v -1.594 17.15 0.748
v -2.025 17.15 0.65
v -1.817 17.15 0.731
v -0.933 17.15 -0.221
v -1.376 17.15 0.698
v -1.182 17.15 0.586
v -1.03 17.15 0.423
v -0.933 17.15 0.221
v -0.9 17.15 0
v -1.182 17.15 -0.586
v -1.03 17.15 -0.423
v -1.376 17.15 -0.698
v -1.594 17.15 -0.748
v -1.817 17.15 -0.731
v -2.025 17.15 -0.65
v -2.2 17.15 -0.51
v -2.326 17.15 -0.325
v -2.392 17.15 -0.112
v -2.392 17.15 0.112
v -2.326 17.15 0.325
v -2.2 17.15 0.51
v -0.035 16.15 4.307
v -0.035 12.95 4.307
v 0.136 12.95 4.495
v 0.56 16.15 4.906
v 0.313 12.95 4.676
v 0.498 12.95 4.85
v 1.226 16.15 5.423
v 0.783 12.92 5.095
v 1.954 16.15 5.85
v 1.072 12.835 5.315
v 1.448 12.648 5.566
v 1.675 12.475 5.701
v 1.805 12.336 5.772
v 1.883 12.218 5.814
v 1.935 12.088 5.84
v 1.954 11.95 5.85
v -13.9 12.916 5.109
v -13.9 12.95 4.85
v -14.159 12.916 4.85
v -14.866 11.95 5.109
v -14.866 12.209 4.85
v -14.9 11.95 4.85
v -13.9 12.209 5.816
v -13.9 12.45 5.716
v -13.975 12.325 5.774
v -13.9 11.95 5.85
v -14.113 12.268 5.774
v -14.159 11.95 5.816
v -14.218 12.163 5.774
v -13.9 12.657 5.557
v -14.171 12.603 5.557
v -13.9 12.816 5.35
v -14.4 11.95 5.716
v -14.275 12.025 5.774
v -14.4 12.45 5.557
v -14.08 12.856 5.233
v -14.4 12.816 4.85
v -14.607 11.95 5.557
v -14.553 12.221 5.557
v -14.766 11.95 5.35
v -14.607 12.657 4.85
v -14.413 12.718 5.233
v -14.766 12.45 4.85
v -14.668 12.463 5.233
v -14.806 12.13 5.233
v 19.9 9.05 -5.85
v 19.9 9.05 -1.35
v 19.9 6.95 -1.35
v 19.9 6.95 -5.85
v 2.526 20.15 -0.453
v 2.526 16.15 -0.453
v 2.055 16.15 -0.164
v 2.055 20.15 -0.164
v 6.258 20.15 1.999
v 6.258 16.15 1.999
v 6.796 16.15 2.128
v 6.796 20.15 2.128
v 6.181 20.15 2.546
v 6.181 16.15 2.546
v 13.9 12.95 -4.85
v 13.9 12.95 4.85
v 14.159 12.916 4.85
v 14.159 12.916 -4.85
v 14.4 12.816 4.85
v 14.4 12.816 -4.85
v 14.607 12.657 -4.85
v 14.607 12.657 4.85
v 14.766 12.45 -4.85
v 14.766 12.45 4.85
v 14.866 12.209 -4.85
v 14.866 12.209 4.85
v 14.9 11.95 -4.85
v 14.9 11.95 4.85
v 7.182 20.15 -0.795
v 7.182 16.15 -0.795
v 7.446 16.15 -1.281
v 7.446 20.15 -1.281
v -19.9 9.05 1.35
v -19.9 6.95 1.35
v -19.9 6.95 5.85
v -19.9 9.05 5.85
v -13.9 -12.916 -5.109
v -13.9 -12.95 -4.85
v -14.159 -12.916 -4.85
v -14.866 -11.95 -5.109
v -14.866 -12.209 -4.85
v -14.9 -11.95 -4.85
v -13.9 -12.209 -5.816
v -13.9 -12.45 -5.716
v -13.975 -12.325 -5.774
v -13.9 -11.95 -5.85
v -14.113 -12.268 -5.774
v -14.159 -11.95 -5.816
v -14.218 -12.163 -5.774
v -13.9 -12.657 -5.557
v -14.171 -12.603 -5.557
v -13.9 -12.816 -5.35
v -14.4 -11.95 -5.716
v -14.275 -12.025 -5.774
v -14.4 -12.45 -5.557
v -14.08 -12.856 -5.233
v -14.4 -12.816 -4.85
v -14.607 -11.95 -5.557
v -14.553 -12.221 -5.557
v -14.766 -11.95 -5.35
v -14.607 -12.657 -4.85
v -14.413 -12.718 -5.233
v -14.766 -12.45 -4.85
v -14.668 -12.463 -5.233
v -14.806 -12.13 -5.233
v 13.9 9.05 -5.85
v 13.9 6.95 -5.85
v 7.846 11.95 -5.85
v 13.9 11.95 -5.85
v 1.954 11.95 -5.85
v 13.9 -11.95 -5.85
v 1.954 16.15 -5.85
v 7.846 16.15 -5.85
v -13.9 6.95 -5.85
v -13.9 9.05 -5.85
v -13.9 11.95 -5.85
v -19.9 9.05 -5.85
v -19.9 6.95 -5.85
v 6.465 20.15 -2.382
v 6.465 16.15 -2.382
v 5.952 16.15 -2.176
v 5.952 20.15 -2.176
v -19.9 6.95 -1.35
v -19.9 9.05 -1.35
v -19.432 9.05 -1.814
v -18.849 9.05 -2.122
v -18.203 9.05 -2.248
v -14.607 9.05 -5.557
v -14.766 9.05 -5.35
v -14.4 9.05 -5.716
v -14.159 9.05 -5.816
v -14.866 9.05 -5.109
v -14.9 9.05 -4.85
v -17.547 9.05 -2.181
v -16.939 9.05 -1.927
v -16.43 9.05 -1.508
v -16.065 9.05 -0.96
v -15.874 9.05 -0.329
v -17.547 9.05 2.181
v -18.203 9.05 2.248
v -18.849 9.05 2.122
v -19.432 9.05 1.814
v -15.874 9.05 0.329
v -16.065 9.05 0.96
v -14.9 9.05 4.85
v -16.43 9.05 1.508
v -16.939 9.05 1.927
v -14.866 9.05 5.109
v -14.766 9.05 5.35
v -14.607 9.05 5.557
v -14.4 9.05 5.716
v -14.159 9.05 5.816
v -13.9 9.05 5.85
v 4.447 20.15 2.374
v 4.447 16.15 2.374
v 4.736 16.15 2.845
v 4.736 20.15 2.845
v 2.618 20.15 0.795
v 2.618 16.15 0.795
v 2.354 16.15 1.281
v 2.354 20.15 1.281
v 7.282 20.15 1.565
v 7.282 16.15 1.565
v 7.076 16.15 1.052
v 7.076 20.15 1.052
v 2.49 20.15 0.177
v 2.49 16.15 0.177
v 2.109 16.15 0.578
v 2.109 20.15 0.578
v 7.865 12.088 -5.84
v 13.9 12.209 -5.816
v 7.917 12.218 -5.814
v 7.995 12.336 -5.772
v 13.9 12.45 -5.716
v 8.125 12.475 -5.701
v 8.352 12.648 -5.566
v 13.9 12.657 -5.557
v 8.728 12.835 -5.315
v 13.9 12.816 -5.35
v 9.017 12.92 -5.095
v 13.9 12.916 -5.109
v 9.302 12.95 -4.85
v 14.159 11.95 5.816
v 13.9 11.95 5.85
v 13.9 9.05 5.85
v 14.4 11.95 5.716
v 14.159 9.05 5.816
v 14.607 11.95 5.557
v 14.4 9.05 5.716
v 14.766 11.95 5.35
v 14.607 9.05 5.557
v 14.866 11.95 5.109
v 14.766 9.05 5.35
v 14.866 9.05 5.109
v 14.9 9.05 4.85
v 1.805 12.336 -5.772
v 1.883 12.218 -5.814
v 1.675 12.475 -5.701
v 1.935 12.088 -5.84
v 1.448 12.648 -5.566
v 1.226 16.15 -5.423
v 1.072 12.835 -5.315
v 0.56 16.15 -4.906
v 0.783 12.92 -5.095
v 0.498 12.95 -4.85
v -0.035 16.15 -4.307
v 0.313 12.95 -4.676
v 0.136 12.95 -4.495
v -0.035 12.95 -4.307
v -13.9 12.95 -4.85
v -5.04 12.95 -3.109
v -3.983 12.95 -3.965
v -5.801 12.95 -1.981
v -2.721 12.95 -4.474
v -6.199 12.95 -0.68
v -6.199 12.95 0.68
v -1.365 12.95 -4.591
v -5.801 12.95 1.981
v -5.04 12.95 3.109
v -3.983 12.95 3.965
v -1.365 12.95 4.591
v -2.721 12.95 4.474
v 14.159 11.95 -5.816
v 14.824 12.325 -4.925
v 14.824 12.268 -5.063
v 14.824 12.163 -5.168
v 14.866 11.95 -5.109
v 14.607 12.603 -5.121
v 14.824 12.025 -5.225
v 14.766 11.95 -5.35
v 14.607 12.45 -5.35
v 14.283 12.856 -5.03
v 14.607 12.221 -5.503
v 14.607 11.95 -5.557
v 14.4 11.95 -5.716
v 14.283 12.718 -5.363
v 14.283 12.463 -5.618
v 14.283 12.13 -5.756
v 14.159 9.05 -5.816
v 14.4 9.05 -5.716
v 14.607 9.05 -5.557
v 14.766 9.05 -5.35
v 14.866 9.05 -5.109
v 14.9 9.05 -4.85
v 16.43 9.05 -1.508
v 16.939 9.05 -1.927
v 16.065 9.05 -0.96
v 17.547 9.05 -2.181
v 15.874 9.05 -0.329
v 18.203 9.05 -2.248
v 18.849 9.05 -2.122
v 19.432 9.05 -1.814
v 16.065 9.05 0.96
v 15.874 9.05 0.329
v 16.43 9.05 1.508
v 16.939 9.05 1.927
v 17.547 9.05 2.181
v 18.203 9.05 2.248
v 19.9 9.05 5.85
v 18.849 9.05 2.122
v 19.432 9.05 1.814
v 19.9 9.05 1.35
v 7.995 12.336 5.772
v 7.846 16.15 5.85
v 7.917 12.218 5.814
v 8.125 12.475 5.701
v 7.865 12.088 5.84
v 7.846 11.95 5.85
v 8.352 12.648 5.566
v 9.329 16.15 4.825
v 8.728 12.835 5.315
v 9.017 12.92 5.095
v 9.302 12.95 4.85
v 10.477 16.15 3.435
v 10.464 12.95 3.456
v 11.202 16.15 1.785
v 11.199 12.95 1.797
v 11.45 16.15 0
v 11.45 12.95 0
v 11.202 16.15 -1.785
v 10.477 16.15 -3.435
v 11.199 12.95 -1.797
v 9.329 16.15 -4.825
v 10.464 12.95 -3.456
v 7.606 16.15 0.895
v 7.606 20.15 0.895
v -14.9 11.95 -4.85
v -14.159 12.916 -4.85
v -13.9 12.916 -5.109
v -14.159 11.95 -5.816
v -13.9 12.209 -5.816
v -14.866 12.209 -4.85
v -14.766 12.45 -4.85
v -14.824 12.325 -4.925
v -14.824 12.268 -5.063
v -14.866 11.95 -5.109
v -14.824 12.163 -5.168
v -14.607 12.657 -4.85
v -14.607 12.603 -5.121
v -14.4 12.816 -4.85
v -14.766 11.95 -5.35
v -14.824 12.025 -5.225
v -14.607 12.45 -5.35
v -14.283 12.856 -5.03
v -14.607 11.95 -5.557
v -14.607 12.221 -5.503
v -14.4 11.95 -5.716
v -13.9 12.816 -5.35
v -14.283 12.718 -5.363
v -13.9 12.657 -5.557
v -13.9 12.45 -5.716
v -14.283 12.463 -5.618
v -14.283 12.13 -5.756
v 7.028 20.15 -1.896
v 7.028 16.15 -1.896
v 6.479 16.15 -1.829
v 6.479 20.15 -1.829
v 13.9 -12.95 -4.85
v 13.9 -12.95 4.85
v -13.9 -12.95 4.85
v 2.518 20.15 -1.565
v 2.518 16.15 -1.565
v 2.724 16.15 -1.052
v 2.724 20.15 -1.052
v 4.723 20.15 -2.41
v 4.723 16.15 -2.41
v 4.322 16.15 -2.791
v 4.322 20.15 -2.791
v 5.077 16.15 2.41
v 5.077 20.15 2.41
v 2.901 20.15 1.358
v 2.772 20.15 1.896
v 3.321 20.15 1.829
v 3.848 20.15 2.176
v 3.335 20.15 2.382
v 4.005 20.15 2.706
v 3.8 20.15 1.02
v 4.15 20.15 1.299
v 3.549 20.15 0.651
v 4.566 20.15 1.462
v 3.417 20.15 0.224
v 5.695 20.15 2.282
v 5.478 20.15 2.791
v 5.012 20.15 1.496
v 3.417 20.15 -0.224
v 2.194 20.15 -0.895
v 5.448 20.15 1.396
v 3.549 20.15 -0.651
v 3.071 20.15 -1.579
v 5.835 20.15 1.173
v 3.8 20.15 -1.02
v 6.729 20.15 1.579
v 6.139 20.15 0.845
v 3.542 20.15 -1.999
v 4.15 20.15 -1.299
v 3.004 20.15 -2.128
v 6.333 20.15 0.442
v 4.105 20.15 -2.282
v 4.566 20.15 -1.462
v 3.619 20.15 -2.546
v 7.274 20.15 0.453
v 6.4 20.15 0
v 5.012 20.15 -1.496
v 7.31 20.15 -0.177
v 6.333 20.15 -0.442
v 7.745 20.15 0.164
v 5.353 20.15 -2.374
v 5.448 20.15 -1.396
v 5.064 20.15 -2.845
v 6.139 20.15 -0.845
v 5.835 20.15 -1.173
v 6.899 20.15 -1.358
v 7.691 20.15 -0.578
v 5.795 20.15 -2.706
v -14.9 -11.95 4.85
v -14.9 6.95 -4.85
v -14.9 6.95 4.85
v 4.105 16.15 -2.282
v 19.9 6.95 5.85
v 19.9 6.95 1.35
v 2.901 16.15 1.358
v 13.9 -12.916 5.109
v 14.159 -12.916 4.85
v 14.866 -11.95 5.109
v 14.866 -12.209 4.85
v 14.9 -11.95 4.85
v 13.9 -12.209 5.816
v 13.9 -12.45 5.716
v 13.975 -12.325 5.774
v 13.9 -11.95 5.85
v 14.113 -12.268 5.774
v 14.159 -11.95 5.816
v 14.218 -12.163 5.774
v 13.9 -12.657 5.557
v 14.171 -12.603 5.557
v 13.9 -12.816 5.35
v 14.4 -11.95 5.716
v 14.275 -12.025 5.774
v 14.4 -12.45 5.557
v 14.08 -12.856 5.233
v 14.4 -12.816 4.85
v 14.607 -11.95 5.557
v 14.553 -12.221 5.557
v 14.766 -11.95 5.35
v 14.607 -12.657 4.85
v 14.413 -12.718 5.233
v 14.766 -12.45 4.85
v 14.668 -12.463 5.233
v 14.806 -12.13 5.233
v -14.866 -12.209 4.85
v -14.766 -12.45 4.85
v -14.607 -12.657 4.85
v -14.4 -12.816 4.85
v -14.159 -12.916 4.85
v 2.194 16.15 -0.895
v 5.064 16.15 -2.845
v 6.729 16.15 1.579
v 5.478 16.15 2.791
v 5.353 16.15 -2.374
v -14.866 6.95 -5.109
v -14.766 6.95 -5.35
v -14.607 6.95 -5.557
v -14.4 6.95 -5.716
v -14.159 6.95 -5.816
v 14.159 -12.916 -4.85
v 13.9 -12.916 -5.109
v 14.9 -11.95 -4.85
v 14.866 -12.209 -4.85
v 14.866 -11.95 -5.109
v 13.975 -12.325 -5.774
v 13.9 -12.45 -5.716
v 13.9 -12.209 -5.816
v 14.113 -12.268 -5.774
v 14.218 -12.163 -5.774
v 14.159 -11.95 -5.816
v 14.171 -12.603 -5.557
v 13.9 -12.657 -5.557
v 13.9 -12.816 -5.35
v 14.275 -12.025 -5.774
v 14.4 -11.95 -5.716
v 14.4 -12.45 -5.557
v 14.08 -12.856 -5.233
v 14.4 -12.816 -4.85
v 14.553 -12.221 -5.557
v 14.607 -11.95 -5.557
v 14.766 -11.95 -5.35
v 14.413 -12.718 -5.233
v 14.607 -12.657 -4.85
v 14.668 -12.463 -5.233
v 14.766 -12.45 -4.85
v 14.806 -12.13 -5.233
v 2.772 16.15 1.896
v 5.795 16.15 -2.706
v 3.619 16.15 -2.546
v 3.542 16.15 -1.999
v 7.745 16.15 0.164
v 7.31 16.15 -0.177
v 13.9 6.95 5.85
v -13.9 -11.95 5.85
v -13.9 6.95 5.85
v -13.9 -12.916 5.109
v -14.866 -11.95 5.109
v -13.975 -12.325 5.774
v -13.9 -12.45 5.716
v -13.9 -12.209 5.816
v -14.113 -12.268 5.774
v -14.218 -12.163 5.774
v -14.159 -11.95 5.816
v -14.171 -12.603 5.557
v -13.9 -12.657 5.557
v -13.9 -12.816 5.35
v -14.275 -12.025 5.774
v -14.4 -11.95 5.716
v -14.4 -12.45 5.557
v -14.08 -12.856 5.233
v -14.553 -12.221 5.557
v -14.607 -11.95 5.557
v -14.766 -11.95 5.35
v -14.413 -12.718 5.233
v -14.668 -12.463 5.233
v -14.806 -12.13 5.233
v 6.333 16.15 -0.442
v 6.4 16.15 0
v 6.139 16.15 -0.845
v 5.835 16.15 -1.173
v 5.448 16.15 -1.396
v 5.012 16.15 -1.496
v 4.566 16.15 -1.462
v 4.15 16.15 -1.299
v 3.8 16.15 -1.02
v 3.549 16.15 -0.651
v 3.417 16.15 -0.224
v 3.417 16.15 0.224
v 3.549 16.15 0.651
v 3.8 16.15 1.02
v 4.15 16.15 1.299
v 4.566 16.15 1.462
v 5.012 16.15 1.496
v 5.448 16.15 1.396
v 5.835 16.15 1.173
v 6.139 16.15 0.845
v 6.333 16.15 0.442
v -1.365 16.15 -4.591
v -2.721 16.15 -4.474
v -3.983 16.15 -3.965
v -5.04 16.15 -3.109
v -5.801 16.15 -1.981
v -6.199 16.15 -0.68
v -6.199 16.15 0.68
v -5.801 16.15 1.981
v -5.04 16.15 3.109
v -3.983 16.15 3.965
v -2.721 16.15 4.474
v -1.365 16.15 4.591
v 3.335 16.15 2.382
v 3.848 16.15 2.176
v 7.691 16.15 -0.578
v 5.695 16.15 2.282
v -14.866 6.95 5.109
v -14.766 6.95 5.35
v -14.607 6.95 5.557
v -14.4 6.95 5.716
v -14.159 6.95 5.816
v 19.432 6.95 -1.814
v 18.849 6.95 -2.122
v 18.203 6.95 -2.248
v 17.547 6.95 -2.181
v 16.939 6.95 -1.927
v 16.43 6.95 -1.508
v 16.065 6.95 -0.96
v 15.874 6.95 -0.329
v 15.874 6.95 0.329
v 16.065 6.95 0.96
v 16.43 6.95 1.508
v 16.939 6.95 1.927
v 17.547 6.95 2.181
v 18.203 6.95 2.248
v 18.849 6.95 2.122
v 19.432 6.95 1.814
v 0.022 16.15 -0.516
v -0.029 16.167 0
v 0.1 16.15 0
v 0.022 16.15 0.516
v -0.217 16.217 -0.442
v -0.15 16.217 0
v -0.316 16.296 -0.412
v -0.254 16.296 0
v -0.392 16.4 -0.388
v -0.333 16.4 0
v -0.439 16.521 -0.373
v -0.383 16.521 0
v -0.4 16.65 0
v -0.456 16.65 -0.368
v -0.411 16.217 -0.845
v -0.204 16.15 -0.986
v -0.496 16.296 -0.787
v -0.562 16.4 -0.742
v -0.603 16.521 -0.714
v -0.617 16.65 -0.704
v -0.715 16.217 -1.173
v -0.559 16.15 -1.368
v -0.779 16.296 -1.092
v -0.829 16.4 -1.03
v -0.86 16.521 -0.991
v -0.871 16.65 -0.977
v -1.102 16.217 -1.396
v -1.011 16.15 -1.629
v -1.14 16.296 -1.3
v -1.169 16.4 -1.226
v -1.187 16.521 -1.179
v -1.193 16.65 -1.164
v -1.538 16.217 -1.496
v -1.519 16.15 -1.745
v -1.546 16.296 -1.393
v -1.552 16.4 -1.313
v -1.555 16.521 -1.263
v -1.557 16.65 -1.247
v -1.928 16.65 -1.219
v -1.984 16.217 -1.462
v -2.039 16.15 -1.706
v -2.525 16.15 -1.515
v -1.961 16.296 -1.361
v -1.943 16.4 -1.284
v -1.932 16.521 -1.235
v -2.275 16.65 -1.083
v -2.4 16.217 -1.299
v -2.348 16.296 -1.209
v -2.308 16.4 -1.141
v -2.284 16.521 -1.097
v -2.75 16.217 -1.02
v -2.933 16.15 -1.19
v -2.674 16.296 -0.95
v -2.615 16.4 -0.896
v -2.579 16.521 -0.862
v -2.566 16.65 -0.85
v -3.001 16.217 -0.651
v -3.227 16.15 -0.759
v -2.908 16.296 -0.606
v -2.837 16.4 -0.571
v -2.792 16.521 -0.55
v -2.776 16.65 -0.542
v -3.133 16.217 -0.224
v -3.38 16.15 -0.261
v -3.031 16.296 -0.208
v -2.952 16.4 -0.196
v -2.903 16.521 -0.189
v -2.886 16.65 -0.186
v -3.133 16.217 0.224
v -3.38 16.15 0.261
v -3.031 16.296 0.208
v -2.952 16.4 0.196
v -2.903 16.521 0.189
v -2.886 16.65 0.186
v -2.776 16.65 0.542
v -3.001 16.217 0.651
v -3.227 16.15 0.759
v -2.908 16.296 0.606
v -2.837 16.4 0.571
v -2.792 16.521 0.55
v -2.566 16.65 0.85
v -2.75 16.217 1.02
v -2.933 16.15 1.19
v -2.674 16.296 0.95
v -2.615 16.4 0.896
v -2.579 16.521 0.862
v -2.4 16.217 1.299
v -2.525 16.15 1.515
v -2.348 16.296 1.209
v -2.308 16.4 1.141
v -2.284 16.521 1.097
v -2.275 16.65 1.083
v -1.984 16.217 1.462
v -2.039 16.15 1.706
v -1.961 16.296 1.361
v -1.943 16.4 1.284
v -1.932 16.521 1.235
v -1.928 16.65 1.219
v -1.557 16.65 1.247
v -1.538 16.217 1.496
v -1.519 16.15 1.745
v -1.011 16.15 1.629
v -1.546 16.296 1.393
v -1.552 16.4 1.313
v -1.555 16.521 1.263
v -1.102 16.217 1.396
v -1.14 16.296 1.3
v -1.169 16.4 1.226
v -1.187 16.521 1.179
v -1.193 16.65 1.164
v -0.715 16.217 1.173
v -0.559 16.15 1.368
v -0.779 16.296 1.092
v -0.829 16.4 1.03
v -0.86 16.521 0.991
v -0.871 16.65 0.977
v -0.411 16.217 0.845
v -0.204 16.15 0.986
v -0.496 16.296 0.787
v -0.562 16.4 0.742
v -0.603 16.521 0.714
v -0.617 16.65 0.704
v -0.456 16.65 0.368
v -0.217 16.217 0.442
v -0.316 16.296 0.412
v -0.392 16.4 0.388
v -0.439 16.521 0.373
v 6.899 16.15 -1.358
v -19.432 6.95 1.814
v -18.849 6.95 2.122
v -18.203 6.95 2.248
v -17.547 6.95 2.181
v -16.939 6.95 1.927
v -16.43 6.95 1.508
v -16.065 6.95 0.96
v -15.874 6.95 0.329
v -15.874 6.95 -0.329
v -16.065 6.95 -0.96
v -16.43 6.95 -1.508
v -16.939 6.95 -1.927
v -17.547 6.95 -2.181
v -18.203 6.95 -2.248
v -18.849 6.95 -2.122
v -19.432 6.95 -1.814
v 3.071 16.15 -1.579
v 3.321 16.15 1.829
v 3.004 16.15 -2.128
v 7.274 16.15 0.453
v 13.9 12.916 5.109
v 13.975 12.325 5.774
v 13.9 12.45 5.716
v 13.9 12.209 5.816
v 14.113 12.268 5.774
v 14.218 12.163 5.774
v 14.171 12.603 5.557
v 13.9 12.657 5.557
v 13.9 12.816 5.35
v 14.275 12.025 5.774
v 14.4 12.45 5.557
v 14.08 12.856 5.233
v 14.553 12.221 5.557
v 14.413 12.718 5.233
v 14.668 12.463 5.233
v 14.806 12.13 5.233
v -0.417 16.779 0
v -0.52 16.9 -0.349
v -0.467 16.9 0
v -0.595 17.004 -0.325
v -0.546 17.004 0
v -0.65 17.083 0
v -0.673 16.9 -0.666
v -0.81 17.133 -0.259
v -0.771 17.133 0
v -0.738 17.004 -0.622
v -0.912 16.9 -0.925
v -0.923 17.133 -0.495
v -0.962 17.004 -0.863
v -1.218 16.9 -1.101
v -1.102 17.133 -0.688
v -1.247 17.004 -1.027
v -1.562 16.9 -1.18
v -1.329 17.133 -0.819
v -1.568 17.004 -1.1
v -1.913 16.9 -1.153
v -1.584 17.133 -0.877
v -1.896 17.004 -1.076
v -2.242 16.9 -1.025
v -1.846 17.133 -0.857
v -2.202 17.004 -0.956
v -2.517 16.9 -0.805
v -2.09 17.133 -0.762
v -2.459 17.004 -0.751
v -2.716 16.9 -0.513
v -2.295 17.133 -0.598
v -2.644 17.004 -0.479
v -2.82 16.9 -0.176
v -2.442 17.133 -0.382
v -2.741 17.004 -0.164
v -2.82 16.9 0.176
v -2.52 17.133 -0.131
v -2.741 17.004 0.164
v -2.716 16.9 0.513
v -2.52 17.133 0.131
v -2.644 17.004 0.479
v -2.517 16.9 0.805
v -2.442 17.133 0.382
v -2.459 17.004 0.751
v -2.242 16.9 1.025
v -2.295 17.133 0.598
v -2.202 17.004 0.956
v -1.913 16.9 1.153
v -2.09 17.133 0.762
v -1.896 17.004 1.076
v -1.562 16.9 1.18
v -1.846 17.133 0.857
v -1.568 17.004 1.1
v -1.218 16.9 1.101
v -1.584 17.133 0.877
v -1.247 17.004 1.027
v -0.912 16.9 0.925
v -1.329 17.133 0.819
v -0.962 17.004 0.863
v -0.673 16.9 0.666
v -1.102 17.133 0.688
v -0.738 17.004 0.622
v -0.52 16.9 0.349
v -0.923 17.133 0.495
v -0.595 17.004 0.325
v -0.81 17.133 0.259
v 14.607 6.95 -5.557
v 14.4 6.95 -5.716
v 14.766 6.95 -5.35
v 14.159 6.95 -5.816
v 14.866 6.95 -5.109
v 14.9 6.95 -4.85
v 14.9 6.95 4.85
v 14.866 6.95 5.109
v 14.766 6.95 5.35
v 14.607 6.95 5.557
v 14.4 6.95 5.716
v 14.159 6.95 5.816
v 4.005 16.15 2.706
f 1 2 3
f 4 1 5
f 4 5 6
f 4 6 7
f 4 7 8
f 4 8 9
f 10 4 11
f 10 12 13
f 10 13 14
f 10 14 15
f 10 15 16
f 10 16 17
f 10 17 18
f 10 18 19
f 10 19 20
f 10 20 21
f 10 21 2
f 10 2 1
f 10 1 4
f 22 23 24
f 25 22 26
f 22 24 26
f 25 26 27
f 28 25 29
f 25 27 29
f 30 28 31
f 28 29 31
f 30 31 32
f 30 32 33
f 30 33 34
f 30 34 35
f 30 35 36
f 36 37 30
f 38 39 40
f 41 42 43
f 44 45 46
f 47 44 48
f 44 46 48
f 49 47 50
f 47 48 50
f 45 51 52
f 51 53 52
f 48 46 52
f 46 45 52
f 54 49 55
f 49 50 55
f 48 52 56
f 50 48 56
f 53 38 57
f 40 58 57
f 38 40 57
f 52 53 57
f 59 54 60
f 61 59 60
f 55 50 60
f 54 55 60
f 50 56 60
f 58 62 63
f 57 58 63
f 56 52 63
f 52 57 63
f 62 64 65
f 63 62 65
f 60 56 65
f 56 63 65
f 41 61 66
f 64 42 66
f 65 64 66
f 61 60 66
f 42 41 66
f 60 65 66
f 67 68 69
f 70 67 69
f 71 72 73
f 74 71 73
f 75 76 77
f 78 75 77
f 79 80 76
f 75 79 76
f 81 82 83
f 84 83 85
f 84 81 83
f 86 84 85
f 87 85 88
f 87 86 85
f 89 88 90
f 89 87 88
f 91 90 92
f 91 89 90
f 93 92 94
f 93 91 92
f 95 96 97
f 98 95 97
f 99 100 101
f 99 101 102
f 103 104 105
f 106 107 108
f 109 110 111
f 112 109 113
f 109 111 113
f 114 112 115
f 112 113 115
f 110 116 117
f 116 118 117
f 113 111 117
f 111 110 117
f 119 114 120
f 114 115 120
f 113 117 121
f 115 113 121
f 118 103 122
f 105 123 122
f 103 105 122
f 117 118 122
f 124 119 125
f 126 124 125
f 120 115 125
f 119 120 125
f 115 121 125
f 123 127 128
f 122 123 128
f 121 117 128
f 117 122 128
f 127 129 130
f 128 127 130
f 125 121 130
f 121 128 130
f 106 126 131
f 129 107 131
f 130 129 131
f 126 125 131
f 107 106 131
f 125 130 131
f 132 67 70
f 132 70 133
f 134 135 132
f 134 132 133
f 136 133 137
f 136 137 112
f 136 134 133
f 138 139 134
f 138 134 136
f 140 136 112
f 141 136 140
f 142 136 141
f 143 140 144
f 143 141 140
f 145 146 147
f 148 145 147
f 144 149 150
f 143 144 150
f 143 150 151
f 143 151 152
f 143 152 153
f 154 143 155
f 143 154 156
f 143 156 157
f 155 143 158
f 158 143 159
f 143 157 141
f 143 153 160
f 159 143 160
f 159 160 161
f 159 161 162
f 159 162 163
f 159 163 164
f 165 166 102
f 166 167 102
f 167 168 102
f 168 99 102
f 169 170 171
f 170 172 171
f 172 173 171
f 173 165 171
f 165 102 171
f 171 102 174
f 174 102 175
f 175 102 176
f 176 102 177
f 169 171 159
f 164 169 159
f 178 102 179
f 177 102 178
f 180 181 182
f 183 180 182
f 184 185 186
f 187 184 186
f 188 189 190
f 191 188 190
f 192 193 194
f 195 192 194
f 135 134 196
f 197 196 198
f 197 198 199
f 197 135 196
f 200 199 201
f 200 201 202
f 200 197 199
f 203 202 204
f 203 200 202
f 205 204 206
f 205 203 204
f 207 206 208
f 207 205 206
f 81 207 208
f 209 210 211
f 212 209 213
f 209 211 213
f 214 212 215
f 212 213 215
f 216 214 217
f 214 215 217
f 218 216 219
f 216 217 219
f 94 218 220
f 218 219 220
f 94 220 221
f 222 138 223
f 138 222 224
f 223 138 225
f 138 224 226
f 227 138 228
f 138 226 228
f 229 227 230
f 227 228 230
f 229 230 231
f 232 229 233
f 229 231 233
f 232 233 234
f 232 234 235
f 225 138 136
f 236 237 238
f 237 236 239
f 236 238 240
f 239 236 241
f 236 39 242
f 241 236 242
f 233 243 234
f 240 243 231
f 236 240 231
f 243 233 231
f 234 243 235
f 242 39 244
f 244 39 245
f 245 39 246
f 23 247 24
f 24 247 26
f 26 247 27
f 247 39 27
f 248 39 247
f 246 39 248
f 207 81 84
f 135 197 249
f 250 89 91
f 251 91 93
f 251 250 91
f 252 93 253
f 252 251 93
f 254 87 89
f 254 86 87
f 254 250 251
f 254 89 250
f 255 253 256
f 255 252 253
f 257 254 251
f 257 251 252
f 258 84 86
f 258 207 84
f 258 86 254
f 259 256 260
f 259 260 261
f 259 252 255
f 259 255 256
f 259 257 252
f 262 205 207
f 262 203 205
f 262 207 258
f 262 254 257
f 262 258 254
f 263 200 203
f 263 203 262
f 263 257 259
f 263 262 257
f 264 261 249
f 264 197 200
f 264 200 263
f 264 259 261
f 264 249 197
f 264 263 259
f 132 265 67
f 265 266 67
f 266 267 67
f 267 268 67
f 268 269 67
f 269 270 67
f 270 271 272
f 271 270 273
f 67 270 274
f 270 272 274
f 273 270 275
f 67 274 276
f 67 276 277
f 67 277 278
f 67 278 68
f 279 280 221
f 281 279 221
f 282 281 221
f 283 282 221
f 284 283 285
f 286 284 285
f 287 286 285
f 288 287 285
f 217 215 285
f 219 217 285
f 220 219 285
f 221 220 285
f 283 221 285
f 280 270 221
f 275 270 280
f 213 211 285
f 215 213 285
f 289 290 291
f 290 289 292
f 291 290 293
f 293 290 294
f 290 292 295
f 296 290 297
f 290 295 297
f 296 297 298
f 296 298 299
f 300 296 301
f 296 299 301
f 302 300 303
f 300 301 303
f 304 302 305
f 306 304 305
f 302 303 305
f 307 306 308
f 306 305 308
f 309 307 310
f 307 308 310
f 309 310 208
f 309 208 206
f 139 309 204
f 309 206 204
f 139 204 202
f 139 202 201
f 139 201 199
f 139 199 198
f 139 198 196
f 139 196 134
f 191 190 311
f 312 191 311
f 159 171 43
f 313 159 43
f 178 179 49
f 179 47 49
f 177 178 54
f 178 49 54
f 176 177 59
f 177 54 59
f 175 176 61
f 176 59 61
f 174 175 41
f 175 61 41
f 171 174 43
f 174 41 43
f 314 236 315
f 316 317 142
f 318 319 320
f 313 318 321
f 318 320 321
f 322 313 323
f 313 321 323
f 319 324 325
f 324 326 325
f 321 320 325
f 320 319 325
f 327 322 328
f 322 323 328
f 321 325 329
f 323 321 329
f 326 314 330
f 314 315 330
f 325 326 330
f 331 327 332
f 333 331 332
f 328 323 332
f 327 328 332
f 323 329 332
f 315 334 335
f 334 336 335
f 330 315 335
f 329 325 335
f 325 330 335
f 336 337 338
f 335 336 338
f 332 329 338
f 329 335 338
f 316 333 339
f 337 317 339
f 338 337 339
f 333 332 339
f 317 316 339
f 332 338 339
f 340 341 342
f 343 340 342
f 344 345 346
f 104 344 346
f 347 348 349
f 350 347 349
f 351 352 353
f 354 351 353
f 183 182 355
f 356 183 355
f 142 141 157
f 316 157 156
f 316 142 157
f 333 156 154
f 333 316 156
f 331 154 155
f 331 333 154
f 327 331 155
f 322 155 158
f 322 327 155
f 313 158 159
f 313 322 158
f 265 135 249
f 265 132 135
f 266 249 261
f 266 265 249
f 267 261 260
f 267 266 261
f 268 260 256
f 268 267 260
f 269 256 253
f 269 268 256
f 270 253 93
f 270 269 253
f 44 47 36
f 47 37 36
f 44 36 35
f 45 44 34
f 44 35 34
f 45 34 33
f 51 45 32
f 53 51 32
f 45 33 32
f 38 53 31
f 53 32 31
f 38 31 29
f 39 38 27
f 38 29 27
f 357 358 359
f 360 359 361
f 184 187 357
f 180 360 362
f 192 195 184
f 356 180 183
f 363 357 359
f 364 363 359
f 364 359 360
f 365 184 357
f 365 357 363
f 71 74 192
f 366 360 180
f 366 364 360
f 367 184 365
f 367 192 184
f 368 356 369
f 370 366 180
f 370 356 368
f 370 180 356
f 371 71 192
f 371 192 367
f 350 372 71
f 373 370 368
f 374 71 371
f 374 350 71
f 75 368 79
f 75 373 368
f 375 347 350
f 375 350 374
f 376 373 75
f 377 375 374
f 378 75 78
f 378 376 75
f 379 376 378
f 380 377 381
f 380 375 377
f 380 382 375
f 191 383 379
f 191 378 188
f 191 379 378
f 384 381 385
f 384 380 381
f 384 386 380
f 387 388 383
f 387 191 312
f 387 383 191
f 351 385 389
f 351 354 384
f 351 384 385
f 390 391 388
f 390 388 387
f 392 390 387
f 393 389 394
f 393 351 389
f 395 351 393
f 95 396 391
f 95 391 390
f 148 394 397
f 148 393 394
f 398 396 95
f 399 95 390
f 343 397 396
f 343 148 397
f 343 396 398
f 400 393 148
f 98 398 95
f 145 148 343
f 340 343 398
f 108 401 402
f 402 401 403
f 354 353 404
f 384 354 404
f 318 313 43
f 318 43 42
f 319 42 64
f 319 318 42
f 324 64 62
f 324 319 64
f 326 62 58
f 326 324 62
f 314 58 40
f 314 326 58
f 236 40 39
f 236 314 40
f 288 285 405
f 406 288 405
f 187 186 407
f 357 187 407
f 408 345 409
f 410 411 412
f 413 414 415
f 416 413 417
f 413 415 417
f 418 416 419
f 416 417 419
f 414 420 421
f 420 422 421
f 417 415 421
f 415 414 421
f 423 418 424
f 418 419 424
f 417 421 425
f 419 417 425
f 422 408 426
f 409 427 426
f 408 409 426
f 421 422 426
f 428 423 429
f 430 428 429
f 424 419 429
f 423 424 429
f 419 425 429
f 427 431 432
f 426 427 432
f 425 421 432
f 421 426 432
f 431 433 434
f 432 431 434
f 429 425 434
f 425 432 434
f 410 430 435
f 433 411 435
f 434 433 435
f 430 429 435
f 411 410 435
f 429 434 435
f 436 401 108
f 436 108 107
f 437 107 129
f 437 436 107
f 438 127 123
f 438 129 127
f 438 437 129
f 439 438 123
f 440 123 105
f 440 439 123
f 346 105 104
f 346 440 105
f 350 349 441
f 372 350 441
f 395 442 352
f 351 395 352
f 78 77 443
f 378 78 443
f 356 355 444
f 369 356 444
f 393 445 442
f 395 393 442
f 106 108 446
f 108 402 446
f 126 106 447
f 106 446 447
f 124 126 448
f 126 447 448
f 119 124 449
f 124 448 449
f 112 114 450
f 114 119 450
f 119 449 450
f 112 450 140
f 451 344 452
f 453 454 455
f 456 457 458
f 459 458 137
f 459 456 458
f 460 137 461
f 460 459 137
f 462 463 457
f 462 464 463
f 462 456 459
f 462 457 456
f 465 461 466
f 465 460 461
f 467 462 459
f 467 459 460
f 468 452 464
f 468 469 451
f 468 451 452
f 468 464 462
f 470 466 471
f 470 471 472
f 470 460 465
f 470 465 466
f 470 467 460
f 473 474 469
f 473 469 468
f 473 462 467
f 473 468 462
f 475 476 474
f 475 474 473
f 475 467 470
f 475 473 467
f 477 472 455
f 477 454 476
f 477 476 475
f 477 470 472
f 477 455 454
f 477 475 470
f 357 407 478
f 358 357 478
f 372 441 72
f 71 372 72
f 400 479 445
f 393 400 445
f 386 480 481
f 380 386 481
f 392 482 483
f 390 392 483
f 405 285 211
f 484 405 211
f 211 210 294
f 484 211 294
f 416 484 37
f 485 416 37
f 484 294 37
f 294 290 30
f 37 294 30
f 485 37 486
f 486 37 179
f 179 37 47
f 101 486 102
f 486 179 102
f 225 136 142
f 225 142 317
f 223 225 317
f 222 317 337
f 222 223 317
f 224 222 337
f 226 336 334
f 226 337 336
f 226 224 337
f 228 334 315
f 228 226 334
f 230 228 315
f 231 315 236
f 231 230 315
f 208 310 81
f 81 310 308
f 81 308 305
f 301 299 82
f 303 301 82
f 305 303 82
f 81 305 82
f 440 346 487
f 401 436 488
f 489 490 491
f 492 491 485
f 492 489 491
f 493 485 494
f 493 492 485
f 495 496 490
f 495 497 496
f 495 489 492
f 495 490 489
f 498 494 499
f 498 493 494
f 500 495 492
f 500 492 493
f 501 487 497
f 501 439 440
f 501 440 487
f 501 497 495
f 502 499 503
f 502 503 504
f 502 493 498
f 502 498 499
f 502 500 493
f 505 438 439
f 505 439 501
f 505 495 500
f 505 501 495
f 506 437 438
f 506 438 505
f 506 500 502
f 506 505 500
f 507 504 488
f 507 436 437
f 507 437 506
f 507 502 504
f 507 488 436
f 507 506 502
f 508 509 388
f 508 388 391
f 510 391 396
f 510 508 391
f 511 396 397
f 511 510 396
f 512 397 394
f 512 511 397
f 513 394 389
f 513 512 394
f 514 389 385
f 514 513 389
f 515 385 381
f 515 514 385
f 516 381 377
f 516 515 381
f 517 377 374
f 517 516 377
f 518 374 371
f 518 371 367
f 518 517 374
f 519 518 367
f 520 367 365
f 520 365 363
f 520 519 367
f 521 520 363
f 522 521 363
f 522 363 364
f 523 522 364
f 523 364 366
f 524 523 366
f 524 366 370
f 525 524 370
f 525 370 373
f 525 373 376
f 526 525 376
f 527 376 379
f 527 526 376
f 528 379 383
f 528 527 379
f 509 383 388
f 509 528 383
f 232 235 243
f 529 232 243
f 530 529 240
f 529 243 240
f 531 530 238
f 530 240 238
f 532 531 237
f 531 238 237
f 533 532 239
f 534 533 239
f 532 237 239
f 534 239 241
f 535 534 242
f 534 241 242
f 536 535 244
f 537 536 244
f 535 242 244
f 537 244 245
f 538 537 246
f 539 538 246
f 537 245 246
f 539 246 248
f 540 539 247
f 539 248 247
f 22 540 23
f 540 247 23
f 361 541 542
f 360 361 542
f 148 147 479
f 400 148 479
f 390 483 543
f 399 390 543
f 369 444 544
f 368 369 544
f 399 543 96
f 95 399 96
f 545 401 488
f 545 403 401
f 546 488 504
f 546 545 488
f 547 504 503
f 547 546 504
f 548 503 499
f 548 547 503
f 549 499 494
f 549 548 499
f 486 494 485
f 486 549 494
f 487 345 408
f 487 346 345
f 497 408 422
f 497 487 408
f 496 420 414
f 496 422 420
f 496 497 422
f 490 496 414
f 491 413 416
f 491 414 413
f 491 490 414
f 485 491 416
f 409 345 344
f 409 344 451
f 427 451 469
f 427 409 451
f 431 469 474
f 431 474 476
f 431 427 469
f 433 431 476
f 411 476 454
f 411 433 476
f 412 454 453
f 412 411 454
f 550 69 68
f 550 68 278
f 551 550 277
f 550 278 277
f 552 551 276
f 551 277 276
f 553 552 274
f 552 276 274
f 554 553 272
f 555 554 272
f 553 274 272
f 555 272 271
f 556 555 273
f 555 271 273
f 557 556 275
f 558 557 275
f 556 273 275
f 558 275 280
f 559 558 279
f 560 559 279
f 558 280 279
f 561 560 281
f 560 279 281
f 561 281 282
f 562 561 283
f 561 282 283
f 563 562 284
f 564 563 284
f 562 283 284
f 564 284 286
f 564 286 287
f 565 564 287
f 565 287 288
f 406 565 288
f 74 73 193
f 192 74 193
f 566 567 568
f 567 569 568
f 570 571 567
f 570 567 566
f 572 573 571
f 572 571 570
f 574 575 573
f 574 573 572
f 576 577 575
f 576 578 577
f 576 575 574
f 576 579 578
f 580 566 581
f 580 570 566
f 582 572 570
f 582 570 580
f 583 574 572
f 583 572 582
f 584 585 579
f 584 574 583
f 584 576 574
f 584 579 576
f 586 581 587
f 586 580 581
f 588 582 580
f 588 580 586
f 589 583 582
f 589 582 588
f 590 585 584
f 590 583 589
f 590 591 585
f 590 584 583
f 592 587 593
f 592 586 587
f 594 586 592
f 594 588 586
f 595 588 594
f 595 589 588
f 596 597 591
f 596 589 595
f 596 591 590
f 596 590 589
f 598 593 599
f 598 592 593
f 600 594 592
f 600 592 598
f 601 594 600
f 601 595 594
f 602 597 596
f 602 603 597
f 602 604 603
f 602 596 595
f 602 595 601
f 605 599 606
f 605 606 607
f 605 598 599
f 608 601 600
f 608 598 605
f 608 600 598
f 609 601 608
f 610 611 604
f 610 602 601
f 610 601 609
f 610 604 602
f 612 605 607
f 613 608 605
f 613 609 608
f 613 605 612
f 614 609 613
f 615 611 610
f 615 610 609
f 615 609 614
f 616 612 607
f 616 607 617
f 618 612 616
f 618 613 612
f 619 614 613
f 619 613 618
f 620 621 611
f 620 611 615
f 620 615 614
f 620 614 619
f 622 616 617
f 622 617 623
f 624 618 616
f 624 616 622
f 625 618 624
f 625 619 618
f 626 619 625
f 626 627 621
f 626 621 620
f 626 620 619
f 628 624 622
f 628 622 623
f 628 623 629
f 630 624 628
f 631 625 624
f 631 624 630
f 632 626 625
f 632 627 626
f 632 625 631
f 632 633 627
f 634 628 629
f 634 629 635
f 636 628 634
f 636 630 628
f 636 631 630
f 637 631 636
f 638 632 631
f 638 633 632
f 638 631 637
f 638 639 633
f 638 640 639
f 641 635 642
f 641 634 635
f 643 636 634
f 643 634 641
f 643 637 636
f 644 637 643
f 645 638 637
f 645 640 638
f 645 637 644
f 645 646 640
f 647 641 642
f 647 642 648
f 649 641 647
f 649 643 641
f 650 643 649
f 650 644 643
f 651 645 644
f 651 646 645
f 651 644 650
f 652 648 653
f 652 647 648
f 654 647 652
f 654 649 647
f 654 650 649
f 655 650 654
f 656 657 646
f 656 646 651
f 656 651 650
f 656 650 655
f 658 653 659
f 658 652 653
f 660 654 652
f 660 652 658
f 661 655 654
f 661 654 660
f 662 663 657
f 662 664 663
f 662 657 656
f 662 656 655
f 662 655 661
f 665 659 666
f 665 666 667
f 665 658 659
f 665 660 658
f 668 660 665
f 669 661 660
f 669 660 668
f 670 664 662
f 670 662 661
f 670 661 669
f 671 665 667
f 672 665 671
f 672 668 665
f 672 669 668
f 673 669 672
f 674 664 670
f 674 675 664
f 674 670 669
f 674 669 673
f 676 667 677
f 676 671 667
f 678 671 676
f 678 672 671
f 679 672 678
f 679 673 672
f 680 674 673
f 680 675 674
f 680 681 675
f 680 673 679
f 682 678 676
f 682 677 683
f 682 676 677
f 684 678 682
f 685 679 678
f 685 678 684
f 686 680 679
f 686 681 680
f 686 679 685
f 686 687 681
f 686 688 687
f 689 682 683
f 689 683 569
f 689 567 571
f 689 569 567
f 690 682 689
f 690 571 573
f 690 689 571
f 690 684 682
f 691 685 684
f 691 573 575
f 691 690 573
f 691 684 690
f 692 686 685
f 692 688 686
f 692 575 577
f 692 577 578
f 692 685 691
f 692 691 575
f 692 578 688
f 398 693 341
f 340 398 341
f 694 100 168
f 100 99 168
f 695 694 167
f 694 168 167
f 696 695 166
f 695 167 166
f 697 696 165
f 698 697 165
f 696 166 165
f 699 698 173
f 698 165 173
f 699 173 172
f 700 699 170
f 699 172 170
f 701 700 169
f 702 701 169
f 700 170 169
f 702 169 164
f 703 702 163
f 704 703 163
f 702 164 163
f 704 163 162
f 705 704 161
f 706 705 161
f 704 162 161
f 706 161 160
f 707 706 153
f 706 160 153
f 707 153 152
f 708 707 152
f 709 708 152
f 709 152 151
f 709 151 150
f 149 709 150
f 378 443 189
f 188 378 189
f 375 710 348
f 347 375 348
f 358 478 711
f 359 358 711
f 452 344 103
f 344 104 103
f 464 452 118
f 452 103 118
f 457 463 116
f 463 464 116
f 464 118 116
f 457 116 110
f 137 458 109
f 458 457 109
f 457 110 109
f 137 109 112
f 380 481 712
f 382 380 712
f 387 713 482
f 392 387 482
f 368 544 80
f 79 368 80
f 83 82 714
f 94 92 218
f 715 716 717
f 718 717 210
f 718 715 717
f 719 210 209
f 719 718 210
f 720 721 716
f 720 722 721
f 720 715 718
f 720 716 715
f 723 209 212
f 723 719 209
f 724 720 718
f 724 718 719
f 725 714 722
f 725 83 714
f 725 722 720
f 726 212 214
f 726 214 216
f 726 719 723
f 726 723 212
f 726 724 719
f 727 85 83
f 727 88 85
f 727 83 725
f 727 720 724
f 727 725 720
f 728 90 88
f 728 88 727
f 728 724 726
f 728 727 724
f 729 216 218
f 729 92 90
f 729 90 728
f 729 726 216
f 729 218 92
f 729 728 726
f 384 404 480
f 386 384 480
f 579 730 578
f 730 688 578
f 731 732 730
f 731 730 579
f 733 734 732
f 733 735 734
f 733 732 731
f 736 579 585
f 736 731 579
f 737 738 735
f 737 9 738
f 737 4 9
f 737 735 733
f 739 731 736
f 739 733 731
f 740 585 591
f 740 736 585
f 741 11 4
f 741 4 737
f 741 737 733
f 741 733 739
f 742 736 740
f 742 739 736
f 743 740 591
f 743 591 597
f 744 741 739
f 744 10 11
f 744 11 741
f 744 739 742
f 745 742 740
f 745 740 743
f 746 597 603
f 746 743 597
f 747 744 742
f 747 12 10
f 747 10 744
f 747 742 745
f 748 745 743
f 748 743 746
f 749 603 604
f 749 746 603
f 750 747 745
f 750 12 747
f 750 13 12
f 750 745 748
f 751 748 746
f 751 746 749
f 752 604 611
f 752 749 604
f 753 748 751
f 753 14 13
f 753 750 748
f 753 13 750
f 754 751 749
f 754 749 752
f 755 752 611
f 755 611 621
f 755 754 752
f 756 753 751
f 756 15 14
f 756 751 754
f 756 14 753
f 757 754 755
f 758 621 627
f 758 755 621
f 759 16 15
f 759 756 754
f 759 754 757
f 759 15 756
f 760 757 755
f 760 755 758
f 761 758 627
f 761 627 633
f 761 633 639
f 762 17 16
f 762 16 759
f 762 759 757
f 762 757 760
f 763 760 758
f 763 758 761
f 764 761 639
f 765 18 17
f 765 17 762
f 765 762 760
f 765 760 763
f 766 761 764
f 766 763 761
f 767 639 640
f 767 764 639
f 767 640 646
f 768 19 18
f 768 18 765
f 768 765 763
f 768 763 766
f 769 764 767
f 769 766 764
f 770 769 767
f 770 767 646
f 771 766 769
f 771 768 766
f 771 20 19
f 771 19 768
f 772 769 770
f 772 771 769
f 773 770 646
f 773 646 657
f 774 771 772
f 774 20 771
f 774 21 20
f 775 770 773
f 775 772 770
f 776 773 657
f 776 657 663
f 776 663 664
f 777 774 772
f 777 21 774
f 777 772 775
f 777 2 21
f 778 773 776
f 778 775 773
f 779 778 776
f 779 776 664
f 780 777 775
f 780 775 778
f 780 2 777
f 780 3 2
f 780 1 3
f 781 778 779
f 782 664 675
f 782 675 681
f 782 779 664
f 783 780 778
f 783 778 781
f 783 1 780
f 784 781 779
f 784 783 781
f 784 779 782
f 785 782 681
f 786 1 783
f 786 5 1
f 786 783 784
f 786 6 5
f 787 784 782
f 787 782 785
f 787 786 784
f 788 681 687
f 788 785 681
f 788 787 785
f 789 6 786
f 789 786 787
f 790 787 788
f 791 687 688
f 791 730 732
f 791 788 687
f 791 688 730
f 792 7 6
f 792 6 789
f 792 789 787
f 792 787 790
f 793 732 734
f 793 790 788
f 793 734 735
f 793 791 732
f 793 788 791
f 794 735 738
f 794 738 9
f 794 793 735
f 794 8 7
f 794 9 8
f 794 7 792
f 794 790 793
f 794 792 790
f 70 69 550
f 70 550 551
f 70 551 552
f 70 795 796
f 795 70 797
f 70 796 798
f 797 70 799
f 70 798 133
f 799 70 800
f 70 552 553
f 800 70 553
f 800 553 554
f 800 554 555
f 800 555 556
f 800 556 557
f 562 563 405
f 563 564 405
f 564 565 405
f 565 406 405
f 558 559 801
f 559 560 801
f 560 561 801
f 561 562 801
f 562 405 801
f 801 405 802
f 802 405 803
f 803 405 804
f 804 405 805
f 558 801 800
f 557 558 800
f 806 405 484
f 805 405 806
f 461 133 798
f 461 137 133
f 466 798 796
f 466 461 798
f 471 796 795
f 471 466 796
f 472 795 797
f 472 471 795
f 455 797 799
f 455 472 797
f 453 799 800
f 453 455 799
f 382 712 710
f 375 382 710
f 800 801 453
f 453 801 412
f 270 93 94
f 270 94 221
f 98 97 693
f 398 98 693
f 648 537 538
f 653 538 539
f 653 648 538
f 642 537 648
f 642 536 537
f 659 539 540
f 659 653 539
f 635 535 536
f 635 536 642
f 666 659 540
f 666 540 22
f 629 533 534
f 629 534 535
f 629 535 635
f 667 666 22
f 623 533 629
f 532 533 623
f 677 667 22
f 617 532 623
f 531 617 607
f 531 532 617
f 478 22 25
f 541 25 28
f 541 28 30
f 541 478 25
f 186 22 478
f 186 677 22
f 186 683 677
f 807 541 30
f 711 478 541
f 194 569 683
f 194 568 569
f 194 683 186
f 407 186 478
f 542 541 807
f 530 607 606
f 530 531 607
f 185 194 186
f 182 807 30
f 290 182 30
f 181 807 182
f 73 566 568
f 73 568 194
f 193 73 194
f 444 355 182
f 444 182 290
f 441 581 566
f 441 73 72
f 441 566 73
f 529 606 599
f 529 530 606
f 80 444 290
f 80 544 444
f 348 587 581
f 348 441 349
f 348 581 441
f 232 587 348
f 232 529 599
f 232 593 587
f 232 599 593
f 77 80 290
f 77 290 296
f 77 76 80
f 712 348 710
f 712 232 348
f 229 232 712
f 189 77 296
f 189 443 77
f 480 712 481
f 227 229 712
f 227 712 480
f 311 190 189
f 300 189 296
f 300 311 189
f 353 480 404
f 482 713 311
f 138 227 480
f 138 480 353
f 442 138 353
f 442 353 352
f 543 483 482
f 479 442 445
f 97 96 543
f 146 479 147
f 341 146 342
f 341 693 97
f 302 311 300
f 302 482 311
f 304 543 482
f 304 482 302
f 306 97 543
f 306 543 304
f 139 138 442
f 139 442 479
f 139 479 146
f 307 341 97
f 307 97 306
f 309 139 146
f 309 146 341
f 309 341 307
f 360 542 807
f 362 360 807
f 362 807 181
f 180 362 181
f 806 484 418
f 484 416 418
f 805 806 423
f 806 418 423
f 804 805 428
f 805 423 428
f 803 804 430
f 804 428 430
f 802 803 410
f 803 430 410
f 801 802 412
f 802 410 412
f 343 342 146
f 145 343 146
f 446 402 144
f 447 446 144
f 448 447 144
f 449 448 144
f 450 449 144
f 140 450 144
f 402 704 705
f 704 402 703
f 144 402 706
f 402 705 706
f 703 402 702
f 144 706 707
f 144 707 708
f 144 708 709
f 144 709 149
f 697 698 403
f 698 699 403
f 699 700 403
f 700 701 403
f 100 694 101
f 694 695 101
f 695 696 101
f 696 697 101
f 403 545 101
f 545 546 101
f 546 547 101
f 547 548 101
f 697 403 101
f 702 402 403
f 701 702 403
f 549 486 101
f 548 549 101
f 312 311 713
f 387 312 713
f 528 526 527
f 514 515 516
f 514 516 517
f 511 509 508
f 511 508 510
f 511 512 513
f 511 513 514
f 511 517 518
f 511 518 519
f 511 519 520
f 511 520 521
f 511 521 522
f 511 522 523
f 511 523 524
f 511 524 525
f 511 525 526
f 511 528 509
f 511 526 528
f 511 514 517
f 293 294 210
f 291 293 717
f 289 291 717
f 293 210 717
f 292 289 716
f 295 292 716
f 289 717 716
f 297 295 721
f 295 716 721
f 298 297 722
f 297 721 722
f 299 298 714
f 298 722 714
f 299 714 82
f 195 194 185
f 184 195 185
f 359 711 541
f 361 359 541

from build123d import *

# Parameters (mm, degrees)
EXTRUDE1_DEPTH    = 5.85
EXTRUDE2_START    = 9.05
SKETCH2_R         = 2.25
EXTRUDE2_DEPTH    = 2.1
EXTRUDE3_START    = 12.95
EXTRUDE3_DEPTH    = 3.2
EXTRUDE6_START    = 16.15
SKETCH6_R         = 1.25
EXTRUDE6_DEPTH    = 1
EXTRUDE4_START    = 16.15
SKETCH4_R         = 2.85
SKETCH4_R_2       = 1.5
EXTRUDE4_DEPTH    = 4
EXTRUDE5_START    = 16.15
EXTRUDE5_DEPTH    = 4
CIRPATTERN1_COUNT = 24
FILLET1_R         = 1
FILLET2_R         = 0.5


with BuildPart() as part:
    # Sketch1 → Extrude1 (new, symmetric)
    with BuildSketch(Plane.XY):
        Polygon((-14.9, -12.95), (-14.9, 6.95), (-19.9, 6.95), (-19.9, 9.05), (-14.9, 9.05), (-14.9, 12.95), (14.9, 12.95), (14.9, 9.05), (19.9, 9.05), (19.9, 6.95), (14.9, 6.95), (14.9, -12.95), align=None)
    extrude(amount=EXTRUDE1_DEPTH, both=True)

    # Sketch2 → Extrude2 (cut)
    with BuildSketch(Plane(origin=(0, 0, 0), x_dir=(1, 0, 0), z_dir=(0, 1, 0)).offset(EXTRUDE2_START)):
        with Locations((-18.1, 0)):
            Circle(SKETCH2_R)
        with Locations((18.1, 0)):
            Circle(SKETCH2_R)
    extrude(amount=-EXTRUDE2_DEPTH, mode=Mode.SUBTRACT)

    # Sketch3 → Extrude3 (add)
    with BuildSketch(Plane(origin=(0, 0, 0), x_dir=(1, 0, 0), z_dir=(0, 1, 0)).offset(EXTRUDE3_START)):
        with BuildLine():
            Line((7.846183973, 5.85), (1.953816027, 5.85))
            ThreePointArc((1.953816027, 5.85), (0.884733475, 5.174952631), (-0.034732824, 4.307076961))
            ThreePointArc((-0.034732824, 4.307076961), (-6.25, 0), (-0.034732824, -4.307076961))
            ThreePointArc((-0.034732824, -4.307076961), (0.884733475, -5.174952631), (1.953816027, -5.85))
            Line((1.953816027, -5.85), (7.846183973, -5.85))
            ThreePointArc((7.846183973, -5.85), (11.45, 0), (7.846183973, 5.85))
        make_face()
    extrude(amount=EXTRUDE3_DEPTH)

    # Sketch6 → Extrude6 (add)
    with BuildSketch(Plane(origin=(0, 0, 0), x_dir=(1, 0, 0), z_dir=(0, 1, 0)).offset(EXTRUDE6_START)):
        with Locations((-1.65, 0)):
            Circle(SKETCH6_R)
    extrude(amount=EXTRUDE6_DEPTH)

    # Sketch4 → Extrude4 (add)
    with BuildSketch(Plane(origin=(0, 0, 0), x_dir=(1, 0, 0), z_dir=(0, 1, 0)).offset(EXTRUDE4_START)):
        with Locations((4.9, 0)):
            Circle(SKETCH4_R)
        with Locations((4.9, 0)):
            Circle(SKETCH4_R_2, mode=Mode.SUBTRACT)
    extrude(amount=EXTRUDE4_DEPTH)

    # Sketch5 → Extrude5 (cut)
    with BuildSketch(Plane(origin=(0, 0, 0), x_dir=(1, 0, 0), z_dir=(0, 1, 0)).offset(EXTRUDE5_START)):
        with BuildLine():
            Line((4.005073985, -2.705846897), (4.447115963, -2.373874784))
            Line((4.447115963, -2.373874784), (4.735892559, -2.845271296))
            ThreePointArc((4.735892559, -2.845271296), (4.365914093, -2.799509286), (4.005073985, -2.705846897))
        make_face()
    extrude5 = extrude(amount=EXTRUDE5_DEPTH, mode=Mode.SUBTRACT)

    # CirPattern1: Extrude5 ×24 about axis
    cirpattern1_axis = Axis((4.9, 0, 0), (0, 1, 0))
    for i in range(1, CIRPATTERN1_COUNT):
        add(extrude5.rotate(cirpattern1_axis, i * 360 / CIRPATTERN1_COUNT), mode=Mode.SUBTRACT)

    # Fillet1
    fillet1_edges = [part.edges().sort_by_distance(p)[0] for p in [
        (11.373091986, 12.95, -5.85),
        (14.9, 12.95, 0),
        (11.373091986, 12.95, 5.85),
        (-6.473091986, 12.95, -5.85),
        (-14.9, 12.95, 0),
        (-6.473091986, 12.95, 5.85),
        (14.9, -12.95, 0),
        (-14.9, -12.95, 0),
        (0, -12.95, 5.85),
        (0, -12.95, -5.85),
        (14.9, 11, -5.85),
        (-14.9, 11, -5.85),
        (-14.9, 11, 5.85),
        (14.9, 11, 5.85),
        (14.9, -3, 5.85),
        (14.9, -3, -5.85),
        (-14.9, -3, -5.85),
        (-14.9, -3, 5.85),
    ]]
    fillet(fillet1_edges, radius=FILLET1_R)

    # Fillet2
    fillet2_edges = [part.edges().sort_by_distance(p)[0] for p in [
        (-2.9, 17.15, 0),
        (-2.9, 16.15, 0),
    ]]
    fillet(fillet2_edges, radius=FILLET2_R - 0.0001)  # a hair under: the kernel refuses the full size


solid = part.part
